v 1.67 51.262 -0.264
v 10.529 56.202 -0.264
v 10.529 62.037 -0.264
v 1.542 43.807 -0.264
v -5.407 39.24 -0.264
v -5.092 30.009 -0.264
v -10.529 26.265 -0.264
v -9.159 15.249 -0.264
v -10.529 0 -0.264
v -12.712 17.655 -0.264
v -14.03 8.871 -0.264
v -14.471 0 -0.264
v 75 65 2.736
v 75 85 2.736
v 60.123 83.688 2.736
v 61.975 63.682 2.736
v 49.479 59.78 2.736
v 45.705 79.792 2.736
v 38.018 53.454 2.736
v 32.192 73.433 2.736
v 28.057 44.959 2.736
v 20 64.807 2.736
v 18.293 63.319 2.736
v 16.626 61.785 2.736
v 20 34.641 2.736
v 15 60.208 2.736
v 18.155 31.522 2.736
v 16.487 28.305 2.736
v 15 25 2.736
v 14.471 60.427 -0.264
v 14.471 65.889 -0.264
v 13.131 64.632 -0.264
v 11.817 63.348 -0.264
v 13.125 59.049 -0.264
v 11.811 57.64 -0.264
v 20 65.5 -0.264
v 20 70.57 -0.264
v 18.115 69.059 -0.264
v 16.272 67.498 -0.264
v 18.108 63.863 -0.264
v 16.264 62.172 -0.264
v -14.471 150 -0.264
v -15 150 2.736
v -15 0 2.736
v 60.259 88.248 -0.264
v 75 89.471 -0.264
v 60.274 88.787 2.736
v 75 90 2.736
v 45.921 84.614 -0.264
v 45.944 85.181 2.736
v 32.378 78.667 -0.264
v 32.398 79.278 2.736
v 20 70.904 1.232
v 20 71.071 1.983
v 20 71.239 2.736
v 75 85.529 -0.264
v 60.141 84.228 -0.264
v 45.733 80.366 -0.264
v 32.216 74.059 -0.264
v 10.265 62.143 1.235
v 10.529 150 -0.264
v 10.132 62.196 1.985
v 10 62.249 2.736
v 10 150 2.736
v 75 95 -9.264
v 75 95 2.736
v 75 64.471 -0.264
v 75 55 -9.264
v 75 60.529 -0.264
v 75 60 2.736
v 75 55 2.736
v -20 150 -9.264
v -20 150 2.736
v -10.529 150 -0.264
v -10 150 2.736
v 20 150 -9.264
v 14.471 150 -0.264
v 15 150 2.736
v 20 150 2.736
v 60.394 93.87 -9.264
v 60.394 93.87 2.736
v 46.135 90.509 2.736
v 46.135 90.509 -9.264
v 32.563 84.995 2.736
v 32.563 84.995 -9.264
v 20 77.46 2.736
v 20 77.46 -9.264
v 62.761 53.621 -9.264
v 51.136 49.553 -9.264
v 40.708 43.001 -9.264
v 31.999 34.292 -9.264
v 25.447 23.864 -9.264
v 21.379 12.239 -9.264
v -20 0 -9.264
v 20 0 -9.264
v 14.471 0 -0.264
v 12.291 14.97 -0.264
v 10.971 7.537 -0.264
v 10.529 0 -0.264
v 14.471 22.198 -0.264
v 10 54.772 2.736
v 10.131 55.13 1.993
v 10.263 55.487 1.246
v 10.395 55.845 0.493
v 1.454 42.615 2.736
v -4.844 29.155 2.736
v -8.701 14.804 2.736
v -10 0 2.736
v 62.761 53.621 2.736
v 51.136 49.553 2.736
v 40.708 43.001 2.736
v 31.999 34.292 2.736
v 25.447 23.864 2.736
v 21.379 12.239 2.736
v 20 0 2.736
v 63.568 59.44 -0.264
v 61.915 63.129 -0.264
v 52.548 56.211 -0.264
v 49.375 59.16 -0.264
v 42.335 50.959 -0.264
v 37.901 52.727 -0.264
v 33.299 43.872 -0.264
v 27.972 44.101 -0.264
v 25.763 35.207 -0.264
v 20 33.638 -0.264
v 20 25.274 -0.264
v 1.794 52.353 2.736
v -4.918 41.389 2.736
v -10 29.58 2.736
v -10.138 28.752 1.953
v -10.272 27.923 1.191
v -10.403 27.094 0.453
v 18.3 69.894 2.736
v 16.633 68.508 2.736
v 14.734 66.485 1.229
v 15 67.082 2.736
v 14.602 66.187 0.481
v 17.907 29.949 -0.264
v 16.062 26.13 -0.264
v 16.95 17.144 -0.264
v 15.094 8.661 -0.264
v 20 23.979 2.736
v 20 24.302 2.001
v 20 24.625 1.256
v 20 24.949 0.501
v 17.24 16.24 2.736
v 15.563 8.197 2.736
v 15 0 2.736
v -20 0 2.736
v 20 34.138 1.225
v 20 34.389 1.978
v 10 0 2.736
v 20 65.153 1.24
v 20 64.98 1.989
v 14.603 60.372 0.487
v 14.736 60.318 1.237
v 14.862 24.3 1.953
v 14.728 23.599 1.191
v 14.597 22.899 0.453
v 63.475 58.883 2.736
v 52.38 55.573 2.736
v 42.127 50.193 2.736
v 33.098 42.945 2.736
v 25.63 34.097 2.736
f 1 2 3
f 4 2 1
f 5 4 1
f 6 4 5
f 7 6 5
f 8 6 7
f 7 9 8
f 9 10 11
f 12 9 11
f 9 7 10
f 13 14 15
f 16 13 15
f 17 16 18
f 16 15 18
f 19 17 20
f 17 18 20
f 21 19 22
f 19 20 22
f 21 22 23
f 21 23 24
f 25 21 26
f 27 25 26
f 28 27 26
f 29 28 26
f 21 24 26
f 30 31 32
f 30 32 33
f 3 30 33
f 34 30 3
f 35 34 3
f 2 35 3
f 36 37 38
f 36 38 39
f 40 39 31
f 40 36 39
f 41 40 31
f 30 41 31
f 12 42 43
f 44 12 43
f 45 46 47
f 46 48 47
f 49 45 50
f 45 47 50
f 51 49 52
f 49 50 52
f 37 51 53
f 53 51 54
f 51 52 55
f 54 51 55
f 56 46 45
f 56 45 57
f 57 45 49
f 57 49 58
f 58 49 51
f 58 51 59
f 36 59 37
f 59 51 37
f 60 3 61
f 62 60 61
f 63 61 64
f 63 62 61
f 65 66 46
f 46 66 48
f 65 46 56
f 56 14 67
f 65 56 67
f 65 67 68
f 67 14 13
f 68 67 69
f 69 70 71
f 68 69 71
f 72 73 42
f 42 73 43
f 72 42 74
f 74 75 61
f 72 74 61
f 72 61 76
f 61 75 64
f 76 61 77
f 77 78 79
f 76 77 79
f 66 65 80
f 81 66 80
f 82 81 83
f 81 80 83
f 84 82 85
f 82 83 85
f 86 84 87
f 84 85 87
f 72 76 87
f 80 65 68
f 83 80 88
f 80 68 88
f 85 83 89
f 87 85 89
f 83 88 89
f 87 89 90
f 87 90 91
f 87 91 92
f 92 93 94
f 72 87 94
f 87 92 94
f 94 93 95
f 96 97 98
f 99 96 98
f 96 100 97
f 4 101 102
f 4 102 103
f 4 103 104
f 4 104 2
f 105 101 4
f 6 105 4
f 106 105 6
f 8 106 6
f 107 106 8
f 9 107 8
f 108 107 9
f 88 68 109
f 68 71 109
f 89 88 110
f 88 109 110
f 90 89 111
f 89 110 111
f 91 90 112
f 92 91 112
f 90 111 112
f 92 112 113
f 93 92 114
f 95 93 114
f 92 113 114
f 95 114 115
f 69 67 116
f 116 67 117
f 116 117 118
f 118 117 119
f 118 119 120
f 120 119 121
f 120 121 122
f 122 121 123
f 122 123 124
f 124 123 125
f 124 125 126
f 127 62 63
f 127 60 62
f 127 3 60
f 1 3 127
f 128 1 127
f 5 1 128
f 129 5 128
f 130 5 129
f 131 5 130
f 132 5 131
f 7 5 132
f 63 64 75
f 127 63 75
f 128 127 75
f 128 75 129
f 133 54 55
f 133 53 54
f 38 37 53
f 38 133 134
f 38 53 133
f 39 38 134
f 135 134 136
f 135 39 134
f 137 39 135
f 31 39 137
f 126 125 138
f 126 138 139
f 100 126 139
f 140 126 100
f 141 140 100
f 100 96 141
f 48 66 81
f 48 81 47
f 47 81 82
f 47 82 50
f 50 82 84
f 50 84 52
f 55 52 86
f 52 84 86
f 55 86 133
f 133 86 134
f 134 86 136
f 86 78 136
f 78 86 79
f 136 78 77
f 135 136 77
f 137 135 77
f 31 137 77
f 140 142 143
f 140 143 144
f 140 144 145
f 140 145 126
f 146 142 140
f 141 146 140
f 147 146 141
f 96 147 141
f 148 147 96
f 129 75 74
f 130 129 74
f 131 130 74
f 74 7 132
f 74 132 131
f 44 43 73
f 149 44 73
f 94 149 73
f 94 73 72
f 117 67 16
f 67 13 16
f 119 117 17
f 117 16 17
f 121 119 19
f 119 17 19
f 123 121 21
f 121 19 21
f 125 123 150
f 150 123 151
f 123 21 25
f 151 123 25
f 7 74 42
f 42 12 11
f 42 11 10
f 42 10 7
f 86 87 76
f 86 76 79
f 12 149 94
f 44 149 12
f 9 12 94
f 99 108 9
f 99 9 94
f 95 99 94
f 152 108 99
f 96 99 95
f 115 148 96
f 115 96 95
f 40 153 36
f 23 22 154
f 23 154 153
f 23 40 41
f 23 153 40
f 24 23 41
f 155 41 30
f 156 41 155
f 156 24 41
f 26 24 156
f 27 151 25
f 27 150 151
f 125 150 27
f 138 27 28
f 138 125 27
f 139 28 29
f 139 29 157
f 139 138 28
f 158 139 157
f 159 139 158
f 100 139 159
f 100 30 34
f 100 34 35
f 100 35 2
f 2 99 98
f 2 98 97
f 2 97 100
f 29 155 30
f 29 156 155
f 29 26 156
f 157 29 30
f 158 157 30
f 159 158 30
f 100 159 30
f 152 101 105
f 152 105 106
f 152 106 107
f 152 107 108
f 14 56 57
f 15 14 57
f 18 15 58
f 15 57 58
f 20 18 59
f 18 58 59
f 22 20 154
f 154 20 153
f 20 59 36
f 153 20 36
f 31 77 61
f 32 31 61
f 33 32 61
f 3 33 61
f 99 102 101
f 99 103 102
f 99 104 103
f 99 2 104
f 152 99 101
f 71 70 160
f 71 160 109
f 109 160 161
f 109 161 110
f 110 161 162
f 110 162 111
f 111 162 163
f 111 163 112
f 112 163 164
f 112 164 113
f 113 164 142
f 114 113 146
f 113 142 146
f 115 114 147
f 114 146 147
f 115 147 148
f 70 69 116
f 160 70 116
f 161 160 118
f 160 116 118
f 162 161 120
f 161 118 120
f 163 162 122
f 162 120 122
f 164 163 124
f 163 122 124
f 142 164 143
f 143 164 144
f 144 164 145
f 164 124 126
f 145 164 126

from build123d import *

# Parameters (mm, degrees)
F1_DEPTH = 150
F5_DEPTH = 150


with BuildPart() as f1:
    # F0 (on Front) → F1 (new body)
    with BuildSketch(Plane.XZ):
        Polygon((-15, 2.7359369216), (-20, 2.7359369216), (-20, -9.2640630784), (20, -9.2640630784), (20, 2.7359369216), (15, 2.7359369216), (14.4710190579, -0.2640630784), (10.5289809421, -0.2640630784), (10, 2.7359369216), (-10, 2.7359369216), (-10.5289809421, -0.2640630784), (-14.4710190579, -0.2640630784), align=None)
    extrude(amount=-F1_DEPTH)

    # F3: sweep along a path in F2
    with BuildLine(Plane.XY) as f3_path:
        ThreePointArc((75, 75), (21.966991411, 53.033008589), (0, 0))
    # F0 (on Front) → F3 (sweep)
    with BuildSketch(Plane.XZ):
        Polygon((-15, 2.7359369216), (-20, 2.7359369216), (-20, -9.2640630784), (20, -9.2640630784), (20, 2.7359369216), (15, 2.7359369216), (14.4710190579, -0.2640630784), (10.5289809421, -0.2640630784), (10, 2.7359369216), (-10, 2.7359369216), (-10.5289809421, -0.2640630784), (-14.4710190579, -0.2640630784), align=None)
    sweep(path=f3_path.line)

    # F4 (on face) → F5 (cut, through all)
    with BuildSketch(Plane.XZ):
        Polygon((-10, 2.7359369216), (-15, 2.7359369216), (-14.4710190579, -0.2640630784), (-10.5289809421, -0.2640630784), align=None)
        Polygon((15, 2.7359369216), (10, 2.7359369216), (10.5289809421, -0.2640630784), (14.4710190579, -0.2640630784), align=None)
    extrude(amount=-F5_DEPTH, mode=Mode.SUBTRACT)

    # F6: sweep along a path in F2
    with BuildLine(Plane.XY) as f6_path:
        ThreePointArc((75, 75), (21.966991411, 53.033008589), (0, 0))
    # F4 (on face) → F6 (sweep, cut)
    with BuildSketch(Plane.XZ):
        Polygon((-10, 2.7359369216), (-15, 2.7359369216), (-14.4710190579, -0.2640630784), (-10.5289809421, -0.2640630784), align=None)
        Polygon((15, 2.7359369216), (10, 2.7359369216), (10.5289809421, -0.2640630784), (14.4710190579, -0.2640630784), align=None)
    sweep(path=f6_path.line, mode=Mode.SUBTRACT)


solid = f1.part
